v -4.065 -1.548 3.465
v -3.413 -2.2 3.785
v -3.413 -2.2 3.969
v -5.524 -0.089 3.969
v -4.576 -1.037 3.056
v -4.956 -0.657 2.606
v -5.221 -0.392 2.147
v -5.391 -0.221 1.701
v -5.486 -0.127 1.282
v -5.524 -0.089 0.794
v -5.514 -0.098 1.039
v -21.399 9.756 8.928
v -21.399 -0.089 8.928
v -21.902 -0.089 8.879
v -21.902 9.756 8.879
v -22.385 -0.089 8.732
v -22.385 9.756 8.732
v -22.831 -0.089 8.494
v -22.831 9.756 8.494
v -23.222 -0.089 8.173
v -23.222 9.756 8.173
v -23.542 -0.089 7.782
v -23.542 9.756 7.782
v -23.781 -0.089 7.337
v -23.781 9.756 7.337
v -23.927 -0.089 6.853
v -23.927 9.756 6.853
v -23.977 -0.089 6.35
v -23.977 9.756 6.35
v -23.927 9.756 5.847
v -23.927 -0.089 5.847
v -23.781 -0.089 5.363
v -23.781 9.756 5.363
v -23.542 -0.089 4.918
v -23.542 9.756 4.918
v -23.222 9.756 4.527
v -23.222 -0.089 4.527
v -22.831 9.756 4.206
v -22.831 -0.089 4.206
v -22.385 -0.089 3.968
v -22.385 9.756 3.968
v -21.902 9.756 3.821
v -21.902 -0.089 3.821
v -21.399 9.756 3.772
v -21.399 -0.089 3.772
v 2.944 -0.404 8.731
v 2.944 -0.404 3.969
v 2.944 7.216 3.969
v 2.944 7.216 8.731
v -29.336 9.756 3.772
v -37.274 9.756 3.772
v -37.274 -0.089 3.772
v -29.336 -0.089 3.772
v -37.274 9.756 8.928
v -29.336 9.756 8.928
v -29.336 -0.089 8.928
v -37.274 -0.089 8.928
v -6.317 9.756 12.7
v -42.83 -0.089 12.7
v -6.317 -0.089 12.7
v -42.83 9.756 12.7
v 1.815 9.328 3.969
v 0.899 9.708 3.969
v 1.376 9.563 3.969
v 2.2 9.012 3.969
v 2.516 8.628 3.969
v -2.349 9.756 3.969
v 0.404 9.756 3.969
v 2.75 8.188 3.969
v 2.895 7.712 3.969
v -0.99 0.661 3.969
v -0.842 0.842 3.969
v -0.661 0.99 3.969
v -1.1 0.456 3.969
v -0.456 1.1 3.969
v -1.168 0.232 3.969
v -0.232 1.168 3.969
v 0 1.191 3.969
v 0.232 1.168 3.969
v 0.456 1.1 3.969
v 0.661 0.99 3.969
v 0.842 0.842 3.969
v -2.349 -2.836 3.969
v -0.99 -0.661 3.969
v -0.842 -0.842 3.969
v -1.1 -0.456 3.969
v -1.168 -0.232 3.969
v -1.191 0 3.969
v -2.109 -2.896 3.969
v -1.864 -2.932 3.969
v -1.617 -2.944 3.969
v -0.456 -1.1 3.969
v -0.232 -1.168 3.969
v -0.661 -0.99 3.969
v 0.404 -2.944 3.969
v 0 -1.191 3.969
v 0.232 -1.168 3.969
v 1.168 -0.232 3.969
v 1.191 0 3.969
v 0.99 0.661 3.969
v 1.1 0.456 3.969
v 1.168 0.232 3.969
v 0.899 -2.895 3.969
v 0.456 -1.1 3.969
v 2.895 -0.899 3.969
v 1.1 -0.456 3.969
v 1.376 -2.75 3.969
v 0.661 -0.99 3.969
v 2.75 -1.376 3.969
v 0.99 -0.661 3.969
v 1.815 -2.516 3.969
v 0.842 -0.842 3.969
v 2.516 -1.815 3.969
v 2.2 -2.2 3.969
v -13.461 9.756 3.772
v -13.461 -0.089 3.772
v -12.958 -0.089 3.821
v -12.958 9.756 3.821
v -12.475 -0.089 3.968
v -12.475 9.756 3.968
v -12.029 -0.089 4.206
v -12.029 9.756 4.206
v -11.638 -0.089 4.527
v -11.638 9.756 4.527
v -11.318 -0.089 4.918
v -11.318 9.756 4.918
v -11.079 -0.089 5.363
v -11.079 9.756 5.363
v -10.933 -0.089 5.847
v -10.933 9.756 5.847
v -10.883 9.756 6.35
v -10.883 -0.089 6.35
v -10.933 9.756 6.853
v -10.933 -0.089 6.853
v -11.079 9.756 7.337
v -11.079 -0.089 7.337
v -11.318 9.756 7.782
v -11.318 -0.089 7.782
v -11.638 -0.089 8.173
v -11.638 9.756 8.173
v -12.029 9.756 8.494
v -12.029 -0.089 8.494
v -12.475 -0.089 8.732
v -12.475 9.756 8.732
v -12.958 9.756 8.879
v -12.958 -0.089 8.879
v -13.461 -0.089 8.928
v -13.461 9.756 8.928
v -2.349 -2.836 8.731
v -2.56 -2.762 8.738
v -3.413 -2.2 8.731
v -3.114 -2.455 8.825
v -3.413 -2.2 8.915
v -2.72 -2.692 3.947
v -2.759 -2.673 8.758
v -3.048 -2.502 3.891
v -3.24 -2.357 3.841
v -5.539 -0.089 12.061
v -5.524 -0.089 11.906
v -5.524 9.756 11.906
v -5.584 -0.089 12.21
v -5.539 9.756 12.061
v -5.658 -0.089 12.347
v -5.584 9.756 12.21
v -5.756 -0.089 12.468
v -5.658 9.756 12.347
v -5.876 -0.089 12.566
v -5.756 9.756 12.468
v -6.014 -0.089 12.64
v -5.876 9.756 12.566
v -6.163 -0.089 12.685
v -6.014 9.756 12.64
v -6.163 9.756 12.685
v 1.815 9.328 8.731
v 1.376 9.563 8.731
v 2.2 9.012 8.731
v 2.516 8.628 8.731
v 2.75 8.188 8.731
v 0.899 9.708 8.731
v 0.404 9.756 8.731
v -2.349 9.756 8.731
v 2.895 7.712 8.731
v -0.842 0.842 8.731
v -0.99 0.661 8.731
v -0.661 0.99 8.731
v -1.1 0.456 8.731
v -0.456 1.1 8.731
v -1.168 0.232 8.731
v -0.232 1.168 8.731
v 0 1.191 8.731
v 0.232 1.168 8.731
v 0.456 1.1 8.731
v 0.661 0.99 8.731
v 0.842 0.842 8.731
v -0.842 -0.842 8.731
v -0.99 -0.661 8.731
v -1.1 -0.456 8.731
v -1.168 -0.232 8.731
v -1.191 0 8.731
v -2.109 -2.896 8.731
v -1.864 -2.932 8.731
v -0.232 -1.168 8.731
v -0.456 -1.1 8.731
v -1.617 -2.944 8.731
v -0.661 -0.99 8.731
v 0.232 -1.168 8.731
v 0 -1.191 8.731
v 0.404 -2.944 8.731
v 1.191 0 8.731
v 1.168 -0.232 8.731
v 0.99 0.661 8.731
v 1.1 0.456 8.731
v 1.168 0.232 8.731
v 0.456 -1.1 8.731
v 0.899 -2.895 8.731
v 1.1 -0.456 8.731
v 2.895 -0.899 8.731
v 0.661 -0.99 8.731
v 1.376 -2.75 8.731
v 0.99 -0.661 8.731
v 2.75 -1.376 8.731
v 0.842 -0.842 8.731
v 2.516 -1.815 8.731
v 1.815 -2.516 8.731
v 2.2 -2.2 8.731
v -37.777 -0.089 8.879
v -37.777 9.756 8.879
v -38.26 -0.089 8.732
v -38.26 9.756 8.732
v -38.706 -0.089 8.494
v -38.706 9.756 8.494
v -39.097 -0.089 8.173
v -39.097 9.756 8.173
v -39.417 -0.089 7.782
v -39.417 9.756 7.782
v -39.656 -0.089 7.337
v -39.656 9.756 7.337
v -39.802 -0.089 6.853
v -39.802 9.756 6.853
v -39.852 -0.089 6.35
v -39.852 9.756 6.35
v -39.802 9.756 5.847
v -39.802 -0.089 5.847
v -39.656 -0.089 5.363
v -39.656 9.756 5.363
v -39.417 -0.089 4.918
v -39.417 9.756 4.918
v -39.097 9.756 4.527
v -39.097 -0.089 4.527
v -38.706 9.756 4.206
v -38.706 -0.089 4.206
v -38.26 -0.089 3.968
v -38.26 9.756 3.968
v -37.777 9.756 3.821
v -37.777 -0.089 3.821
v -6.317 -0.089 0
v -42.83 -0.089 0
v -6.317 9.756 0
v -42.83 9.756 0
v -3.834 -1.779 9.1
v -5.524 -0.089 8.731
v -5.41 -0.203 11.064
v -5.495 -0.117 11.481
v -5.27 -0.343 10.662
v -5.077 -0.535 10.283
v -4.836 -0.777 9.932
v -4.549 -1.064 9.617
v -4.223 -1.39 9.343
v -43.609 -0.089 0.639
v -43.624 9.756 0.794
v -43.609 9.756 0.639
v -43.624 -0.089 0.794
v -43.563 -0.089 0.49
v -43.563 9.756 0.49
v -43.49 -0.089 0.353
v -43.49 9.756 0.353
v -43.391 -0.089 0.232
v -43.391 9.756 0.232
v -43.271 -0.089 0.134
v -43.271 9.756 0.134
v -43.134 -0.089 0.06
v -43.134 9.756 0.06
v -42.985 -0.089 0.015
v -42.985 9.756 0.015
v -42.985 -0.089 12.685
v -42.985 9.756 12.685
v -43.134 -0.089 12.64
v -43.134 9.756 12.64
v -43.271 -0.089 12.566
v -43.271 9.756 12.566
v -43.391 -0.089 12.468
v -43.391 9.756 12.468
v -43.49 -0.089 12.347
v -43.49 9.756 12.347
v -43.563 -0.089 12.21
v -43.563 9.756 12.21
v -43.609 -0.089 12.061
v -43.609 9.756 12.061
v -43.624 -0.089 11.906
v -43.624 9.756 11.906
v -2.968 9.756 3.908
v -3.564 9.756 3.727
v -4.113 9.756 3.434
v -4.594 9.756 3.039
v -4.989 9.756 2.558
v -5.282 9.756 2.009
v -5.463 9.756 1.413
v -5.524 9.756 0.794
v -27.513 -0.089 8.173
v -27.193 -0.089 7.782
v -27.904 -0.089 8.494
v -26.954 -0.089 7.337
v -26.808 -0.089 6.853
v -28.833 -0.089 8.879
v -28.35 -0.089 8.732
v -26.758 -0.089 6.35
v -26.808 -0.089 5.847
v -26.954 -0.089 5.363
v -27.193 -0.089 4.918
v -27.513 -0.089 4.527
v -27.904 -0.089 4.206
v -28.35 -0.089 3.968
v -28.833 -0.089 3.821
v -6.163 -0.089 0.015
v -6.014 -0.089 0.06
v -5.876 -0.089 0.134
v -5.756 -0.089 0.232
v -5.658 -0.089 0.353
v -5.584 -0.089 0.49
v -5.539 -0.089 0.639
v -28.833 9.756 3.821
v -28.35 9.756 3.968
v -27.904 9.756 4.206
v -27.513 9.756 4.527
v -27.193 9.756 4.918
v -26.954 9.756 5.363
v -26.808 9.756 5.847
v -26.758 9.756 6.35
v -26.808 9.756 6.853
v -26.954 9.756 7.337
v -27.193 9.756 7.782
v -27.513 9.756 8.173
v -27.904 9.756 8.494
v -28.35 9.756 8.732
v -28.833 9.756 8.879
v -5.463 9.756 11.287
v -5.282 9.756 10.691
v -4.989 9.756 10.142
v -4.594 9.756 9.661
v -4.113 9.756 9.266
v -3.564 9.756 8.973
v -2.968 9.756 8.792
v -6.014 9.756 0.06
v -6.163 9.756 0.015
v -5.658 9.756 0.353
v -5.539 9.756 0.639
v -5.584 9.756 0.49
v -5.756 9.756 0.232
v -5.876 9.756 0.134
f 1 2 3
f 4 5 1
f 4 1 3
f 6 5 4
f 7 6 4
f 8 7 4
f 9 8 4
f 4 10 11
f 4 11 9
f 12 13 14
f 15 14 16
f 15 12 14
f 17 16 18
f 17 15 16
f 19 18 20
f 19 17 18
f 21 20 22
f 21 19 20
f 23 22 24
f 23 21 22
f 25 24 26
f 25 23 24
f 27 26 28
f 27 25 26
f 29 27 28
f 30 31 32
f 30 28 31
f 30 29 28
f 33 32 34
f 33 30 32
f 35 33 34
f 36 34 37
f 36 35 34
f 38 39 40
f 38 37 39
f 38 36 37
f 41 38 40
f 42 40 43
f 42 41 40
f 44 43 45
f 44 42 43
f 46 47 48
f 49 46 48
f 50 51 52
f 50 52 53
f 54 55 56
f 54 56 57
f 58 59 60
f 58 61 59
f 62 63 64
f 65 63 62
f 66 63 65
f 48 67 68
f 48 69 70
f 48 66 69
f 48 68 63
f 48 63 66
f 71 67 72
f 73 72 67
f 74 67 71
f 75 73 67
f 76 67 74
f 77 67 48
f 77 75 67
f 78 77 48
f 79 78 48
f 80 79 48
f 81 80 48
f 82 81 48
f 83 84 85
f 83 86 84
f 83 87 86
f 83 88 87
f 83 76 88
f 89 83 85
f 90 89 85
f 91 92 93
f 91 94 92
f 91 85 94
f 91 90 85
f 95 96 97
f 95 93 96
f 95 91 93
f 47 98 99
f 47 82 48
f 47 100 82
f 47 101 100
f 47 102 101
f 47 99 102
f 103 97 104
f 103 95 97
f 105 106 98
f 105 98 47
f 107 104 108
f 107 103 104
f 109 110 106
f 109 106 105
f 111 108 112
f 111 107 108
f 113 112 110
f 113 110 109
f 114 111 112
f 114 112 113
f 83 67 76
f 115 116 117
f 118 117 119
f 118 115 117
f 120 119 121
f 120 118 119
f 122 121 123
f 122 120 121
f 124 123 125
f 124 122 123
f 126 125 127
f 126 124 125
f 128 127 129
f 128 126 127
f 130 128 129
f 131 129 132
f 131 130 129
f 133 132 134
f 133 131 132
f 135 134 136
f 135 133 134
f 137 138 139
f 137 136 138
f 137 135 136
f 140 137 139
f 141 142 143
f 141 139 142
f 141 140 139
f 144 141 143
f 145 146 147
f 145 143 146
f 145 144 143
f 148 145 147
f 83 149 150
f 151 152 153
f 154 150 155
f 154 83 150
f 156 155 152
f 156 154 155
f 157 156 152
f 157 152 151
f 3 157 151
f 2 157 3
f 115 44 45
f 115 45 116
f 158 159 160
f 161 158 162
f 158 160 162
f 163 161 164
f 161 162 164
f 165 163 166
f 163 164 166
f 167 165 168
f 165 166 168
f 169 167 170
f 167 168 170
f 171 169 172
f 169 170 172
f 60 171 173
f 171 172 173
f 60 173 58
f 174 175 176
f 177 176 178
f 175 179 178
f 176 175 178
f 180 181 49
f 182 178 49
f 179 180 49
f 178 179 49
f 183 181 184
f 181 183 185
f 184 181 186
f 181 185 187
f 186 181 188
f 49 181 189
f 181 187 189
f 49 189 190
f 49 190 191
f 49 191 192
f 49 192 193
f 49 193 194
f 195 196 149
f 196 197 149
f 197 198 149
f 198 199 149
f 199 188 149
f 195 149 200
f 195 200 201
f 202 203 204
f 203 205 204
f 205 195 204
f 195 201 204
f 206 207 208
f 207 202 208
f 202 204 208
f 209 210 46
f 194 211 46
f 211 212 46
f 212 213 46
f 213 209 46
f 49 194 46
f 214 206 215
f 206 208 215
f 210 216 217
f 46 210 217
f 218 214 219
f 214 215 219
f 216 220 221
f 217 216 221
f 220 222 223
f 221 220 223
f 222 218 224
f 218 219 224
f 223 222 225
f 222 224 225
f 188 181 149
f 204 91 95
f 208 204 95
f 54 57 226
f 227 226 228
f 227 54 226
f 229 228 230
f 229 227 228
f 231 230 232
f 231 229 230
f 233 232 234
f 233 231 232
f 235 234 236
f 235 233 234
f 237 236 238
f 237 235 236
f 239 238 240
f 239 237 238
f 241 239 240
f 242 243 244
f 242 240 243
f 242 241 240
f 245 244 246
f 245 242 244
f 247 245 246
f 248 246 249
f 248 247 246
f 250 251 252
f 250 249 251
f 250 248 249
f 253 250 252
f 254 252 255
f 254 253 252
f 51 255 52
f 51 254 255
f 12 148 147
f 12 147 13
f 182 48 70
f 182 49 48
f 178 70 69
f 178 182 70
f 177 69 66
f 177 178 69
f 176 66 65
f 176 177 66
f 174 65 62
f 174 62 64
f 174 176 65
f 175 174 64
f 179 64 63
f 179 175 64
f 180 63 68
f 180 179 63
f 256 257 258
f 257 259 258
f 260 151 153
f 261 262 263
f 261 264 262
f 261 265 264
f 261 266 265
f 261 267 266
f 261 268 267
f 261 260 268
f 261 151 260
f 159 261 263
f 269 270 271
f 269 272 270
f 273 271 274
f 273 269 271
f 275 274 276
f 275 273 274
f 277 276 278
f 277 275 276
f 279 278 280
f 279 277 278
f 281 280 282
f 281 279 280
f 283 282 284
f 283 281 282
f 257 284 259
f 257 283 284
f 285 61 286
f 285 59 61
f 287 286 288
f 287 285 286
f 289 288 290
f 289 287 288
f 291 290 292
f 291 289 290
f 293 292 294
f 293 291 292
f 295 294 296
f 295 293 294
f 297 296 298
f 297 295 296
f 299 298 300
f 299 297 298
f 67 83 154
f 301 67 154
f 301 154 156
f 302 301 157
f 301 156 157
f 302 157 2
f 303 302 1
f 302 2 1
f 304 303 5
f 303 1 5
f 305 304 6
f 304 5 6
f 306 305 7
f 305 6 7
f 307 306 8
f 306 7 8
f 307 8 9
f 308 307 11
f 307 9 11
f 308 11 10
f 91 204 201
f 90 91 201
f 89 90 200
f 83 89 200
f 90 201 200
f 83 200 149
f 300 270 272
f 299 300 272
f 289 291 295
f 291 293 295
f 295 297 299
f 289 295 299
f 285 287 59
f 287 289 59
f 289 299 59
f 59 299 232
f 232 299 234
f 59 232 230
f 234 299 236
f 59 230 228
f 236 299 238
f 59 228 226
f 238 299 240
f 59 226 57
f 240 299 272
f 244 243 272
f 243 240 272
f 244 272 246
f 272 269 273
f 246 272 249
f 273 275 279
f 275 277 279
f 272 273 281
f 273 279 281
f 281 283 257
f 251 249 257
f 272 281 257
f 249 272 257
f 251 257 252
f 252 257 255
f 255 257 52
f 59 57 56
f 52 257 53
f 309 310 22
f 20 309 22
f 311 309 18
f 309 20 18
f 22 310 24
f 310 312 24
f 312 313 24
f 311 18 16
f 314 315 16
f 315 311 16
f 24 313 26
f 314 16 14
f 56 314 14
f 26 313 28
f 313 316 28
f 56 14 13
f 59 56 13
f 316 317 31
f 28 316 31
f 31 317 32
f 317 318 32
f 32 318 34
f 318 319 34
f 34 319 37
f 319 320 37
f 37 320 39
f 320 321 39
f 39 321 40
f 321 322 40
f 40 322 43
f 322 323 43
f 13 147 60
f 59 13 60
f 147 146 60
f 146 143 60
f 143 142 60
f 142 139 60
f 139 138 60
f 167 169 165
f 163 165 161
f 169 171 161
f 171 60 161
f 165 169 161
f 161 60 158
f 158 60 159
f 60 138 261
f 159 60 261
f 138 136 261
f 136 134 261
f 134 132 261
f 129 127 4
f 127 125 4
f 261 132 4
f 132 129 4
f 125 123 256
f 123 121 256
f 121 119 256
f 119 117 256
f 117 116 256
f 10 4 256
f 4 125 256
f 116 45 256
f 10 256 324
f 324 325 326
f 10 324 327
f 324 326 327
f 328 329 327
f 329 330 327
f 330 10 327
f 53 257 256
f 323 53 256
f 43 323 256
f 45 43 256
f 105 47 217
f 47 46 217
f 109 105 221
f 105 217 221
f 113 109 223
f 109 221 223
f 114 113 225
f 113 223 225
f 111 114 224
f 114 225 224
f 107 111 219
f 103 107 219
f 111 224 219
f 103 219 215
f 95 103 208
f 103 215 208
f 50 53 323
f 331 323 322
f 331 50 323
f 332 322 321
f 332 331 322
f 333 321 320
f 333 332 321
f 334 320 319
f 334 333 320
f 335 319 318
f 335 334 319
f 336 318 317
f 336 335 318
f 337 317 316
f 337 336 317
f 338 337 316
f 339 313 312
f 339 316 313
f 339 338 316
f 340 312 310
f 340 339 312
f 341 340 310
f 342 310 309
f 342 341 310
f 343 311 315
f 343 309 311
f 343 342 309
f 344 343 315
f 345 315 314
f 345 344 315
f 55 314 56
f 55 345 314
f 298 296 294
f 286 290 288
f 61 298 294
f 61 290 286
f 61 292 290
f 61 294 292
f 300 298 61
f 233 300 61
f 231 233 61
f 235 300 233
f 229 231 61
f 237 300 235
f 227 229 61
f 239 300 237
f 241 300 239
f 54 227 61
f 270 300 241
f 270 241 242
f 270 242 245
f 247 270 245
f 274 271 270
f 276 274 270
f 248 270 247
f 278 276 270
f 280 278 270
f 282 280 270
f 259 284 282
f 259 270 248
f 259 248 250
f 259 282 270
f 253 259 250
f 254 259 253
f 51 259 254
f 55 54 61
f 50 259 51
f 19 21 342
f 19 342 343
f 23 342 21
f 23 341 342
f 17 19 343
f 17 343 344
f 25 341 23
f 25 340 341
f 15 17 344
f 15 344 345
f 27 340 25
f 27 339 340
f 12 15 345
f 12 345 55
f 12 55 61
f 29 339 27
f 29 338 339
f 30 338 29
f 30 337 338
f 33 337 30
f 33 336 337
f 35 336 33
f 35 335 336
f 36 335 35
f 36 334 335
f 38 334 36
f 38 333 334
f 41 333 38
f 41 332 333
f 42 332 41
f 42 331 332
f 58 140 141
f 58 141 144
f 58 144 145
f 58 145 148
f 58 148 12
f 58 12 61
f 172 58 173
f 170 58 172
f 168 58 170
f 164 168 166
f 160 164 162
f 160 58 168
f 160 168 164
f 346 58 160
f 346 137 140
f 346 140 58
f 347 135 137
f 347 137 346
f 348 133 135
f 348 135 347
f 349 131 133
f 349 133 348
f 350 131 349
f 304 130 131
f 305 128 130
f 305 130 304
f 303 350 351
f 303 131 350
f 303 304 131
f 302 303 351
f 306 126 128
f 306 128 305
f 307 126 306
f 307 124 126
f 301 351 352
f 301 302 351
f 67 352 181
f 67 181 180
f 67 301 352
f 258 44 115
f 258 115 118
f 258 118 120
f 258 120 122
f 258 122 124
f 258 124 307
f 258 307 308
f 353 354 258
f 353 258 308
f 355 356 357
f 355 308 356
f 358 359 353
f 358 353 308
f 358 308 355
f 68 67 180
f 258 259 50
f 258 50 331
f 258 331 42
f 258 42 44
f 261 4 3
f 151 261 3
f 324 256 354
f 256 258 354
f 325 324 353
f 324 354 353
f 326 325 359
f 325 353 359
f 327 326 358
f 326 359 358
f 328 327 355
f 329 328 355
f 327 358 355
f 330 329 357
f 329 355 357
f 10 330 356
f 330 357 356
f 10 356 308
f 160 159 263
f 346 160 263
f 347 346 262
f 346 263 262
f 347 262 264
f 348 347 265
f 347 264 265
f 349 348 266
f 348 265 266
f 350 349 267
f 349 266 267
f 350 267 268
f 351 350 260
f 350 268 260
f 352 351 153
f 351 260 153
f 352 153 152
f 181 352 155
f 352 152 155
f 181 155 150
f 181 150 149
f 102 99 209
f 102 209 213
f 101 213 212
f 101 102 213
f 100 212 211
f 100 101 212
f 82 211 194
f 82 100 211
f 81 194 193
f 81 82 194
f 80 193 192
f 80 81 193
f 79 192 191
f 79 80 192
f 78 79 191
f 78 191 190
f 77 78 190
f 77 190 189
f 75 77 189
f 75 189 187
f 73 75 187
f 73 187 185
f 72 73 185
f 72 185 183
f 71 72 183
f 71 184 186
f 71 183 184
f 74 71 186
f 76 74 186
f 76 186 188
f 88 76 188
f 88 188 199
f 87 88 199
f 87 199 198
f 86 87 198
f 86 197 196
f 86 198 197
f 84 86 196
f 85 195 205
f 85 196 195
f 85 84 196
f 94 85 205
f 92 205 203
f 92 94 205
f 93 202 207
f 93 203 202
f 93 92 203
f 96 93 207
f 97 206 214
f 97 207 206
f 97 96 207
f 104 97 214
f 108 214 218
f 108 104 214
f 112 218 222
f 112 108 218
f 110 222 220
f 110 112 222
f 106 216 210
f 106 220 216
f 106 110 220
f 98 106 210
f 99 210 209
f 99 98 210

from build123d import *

# Parameters (mm, degrees)
SKETCH1_R           = 1.190625
BOSS_EXTRUDE1_DEPTH = 12.7
SKETCH5_W           = 8.46735418
SKETCH5_H           = 3.96875
CUT_EXTRUDE2_DEPTH  = 48.176397098
FILLET1_R           = 2.54
FILLET2_START       = -2.835892255
FILLET2_DEPTH       = 12.592298151
FILLET2_2_DEPTH     = 13
CUT_EXTRUDE3_DEPTH  = 48.176397125
FILLET3_R           = 0.79375


with BuildPart() as part:
    # Sketch1 → Boss-Extrude1 (new body)
    with BuildSketch(Plane.XY):
        Polygon((2.943594104, -2.943594104), (2.943594104, 9.756405896), (-43.623760076, 9.756405896), (-43.623760076, -0.0889), (-5.523760076, -0.0889), (-2.669065971, -2.943594104), align=None)
        Circle(SKETCH1_R, mode=Mode.SUBTRACT)
    extrude(amount=BOSS_EXTRUDE1_DEPTH)

    # Sketch5 → Cut-Extrude2 (cut, through all)
    with BuildSketch(Plane.XZ.offset(2.943594104)):
        with Locations((-1.290082986, 10.715625)):
            Rectangle(SKETCH5_W, SKETCH5_H)
        with Locations((-1.290082986, 1.984375)):
            Rectangle(SKETCH5_W, SKETCH5_H)
    extrude(amount=-CUT_EXTRUDE2_DEPTH, mode=Mode.SUBTRACT)

    # Fillet1
    fillet1_edges = [part.edges().sort_by_distance(p)[0] for p in [
        (-2.669065971, -2.943594104, 6.35),
        (2.943594104, 9.756405896, 6.35),
        (2.943594104, -2.943594104, 6.35),
    ]]
    fillet(fillet1_edges, radius=FILLET1_R)

    # Fillet2: read off the stored shape, not the designer's step
    # Fillet2 outline → Fillet2 (add)
    with BuildSketch(Plane(origin=(0, 0, 0), x_dir=(1, 0, 0), z_dir=(0, 1, 0)).offset(FILLET2_START)):
        with BuildLine():
            ThreePointArc((-5.523760076, -11.90625), (-4.593824106, -9.66118597), (-2.348760076, -8.73125))
            Line((-2.348760076, -8.73125), (-5.523760076, -8.73125))
            Line((-5.523760076, -8.73125), (-5.523760076, -11.90625))
        make_face()
        with BuildLine():
            ThreePointArc((-2.348760076, -3.96875), (-4.593824106, -3.03881403), (-5.523760076, -0.79375))
            Line((-5.523760076, -0.79375), (-5.523760076, -3.96875))
            Line((-5.523760076, -3.96875), (-2.348760076, -3.96875))
        make_face()
    extrude(amount=FILLET2_DEPTH)

    # Fillet2 2 outline → Fillet2 2 (cut)
    with BuildSketch(Plane.XY):
        with BuildLine():
            ThreePointArc((-2.348760048, -2.835892163), (-2.92030771, -2.583707388), (-3.413014747, -2.199645328))
            Line((-3.413014747, -2.199645328), (-5.523760076, -0.0889))
            Line((-5.523760076, -0.0889), (-5.523760076, -2.835892255))
            Line((-5.523760076, -2.835892255), (-2.348760048, -2.835892163))
        make_face()
    extrude(amount=FILLET2_2_DEPTH, mode=Mode.SUBTRACT)

    # Sketch9 → Cut-Extrude3 (cut, through all)
    with BuildSketch(Plane(origin=(0, 9.756405896, 0), x_dir=(1, 0, 0), z_dir=(0, 1, 0))):
        with BuildLine():
            Line((-37.273760076, -3.7719), (-29.336260076, -3.7719))
            ThreePointArc((-29.336260076, -3.7719), (-26.758160076, -6.35), (-29.336260076, -8.9281))
            Line((-29.336260076, -8.9281), (-37.273760076, -8.9281))
            ThreePointArc((-37.273760076, -8.9281), (-39.851860076, -6.35), (-37.273760076, -3.7719))
        make_face()
        with BuildLine():
            Line((-21.398760076, -3.7719), (-13.461260076, -3.7719))
            ThreePointArc((-13.461260076, -3.7719), (-10.883160076, -6.35), (-13.461260076, -8.9281))
            Line((-13.461260076, -8.9281), (-21.398760076, -8.9281))
            ThreePointArc((-21.398760076, -8.9281), (-23.976860076, -6.35), (-21.398760076, -3.7719))
        make_face()
    extrude(amount=-CUT_EXTRUDE3_DEPTH, mode=Mode.SUBTRACT)

    # Fillet3
    fillet3_edges = [part.edges().sort_by_distance(p)[0] for p in [
        (-43.623760076, 4.833752948, 12.7),
        (-43.623760076, 4.833752948, 0),
        (-5.523760076, 4.833752948, 12.7),
        (-5.523760076, 4.833752948, 0),
    ]]
    fillet(fillet3_edges, radius=FILLET3_R - 0.0001)  # a hair under: the kernel refuses the full size


solid = part.part
